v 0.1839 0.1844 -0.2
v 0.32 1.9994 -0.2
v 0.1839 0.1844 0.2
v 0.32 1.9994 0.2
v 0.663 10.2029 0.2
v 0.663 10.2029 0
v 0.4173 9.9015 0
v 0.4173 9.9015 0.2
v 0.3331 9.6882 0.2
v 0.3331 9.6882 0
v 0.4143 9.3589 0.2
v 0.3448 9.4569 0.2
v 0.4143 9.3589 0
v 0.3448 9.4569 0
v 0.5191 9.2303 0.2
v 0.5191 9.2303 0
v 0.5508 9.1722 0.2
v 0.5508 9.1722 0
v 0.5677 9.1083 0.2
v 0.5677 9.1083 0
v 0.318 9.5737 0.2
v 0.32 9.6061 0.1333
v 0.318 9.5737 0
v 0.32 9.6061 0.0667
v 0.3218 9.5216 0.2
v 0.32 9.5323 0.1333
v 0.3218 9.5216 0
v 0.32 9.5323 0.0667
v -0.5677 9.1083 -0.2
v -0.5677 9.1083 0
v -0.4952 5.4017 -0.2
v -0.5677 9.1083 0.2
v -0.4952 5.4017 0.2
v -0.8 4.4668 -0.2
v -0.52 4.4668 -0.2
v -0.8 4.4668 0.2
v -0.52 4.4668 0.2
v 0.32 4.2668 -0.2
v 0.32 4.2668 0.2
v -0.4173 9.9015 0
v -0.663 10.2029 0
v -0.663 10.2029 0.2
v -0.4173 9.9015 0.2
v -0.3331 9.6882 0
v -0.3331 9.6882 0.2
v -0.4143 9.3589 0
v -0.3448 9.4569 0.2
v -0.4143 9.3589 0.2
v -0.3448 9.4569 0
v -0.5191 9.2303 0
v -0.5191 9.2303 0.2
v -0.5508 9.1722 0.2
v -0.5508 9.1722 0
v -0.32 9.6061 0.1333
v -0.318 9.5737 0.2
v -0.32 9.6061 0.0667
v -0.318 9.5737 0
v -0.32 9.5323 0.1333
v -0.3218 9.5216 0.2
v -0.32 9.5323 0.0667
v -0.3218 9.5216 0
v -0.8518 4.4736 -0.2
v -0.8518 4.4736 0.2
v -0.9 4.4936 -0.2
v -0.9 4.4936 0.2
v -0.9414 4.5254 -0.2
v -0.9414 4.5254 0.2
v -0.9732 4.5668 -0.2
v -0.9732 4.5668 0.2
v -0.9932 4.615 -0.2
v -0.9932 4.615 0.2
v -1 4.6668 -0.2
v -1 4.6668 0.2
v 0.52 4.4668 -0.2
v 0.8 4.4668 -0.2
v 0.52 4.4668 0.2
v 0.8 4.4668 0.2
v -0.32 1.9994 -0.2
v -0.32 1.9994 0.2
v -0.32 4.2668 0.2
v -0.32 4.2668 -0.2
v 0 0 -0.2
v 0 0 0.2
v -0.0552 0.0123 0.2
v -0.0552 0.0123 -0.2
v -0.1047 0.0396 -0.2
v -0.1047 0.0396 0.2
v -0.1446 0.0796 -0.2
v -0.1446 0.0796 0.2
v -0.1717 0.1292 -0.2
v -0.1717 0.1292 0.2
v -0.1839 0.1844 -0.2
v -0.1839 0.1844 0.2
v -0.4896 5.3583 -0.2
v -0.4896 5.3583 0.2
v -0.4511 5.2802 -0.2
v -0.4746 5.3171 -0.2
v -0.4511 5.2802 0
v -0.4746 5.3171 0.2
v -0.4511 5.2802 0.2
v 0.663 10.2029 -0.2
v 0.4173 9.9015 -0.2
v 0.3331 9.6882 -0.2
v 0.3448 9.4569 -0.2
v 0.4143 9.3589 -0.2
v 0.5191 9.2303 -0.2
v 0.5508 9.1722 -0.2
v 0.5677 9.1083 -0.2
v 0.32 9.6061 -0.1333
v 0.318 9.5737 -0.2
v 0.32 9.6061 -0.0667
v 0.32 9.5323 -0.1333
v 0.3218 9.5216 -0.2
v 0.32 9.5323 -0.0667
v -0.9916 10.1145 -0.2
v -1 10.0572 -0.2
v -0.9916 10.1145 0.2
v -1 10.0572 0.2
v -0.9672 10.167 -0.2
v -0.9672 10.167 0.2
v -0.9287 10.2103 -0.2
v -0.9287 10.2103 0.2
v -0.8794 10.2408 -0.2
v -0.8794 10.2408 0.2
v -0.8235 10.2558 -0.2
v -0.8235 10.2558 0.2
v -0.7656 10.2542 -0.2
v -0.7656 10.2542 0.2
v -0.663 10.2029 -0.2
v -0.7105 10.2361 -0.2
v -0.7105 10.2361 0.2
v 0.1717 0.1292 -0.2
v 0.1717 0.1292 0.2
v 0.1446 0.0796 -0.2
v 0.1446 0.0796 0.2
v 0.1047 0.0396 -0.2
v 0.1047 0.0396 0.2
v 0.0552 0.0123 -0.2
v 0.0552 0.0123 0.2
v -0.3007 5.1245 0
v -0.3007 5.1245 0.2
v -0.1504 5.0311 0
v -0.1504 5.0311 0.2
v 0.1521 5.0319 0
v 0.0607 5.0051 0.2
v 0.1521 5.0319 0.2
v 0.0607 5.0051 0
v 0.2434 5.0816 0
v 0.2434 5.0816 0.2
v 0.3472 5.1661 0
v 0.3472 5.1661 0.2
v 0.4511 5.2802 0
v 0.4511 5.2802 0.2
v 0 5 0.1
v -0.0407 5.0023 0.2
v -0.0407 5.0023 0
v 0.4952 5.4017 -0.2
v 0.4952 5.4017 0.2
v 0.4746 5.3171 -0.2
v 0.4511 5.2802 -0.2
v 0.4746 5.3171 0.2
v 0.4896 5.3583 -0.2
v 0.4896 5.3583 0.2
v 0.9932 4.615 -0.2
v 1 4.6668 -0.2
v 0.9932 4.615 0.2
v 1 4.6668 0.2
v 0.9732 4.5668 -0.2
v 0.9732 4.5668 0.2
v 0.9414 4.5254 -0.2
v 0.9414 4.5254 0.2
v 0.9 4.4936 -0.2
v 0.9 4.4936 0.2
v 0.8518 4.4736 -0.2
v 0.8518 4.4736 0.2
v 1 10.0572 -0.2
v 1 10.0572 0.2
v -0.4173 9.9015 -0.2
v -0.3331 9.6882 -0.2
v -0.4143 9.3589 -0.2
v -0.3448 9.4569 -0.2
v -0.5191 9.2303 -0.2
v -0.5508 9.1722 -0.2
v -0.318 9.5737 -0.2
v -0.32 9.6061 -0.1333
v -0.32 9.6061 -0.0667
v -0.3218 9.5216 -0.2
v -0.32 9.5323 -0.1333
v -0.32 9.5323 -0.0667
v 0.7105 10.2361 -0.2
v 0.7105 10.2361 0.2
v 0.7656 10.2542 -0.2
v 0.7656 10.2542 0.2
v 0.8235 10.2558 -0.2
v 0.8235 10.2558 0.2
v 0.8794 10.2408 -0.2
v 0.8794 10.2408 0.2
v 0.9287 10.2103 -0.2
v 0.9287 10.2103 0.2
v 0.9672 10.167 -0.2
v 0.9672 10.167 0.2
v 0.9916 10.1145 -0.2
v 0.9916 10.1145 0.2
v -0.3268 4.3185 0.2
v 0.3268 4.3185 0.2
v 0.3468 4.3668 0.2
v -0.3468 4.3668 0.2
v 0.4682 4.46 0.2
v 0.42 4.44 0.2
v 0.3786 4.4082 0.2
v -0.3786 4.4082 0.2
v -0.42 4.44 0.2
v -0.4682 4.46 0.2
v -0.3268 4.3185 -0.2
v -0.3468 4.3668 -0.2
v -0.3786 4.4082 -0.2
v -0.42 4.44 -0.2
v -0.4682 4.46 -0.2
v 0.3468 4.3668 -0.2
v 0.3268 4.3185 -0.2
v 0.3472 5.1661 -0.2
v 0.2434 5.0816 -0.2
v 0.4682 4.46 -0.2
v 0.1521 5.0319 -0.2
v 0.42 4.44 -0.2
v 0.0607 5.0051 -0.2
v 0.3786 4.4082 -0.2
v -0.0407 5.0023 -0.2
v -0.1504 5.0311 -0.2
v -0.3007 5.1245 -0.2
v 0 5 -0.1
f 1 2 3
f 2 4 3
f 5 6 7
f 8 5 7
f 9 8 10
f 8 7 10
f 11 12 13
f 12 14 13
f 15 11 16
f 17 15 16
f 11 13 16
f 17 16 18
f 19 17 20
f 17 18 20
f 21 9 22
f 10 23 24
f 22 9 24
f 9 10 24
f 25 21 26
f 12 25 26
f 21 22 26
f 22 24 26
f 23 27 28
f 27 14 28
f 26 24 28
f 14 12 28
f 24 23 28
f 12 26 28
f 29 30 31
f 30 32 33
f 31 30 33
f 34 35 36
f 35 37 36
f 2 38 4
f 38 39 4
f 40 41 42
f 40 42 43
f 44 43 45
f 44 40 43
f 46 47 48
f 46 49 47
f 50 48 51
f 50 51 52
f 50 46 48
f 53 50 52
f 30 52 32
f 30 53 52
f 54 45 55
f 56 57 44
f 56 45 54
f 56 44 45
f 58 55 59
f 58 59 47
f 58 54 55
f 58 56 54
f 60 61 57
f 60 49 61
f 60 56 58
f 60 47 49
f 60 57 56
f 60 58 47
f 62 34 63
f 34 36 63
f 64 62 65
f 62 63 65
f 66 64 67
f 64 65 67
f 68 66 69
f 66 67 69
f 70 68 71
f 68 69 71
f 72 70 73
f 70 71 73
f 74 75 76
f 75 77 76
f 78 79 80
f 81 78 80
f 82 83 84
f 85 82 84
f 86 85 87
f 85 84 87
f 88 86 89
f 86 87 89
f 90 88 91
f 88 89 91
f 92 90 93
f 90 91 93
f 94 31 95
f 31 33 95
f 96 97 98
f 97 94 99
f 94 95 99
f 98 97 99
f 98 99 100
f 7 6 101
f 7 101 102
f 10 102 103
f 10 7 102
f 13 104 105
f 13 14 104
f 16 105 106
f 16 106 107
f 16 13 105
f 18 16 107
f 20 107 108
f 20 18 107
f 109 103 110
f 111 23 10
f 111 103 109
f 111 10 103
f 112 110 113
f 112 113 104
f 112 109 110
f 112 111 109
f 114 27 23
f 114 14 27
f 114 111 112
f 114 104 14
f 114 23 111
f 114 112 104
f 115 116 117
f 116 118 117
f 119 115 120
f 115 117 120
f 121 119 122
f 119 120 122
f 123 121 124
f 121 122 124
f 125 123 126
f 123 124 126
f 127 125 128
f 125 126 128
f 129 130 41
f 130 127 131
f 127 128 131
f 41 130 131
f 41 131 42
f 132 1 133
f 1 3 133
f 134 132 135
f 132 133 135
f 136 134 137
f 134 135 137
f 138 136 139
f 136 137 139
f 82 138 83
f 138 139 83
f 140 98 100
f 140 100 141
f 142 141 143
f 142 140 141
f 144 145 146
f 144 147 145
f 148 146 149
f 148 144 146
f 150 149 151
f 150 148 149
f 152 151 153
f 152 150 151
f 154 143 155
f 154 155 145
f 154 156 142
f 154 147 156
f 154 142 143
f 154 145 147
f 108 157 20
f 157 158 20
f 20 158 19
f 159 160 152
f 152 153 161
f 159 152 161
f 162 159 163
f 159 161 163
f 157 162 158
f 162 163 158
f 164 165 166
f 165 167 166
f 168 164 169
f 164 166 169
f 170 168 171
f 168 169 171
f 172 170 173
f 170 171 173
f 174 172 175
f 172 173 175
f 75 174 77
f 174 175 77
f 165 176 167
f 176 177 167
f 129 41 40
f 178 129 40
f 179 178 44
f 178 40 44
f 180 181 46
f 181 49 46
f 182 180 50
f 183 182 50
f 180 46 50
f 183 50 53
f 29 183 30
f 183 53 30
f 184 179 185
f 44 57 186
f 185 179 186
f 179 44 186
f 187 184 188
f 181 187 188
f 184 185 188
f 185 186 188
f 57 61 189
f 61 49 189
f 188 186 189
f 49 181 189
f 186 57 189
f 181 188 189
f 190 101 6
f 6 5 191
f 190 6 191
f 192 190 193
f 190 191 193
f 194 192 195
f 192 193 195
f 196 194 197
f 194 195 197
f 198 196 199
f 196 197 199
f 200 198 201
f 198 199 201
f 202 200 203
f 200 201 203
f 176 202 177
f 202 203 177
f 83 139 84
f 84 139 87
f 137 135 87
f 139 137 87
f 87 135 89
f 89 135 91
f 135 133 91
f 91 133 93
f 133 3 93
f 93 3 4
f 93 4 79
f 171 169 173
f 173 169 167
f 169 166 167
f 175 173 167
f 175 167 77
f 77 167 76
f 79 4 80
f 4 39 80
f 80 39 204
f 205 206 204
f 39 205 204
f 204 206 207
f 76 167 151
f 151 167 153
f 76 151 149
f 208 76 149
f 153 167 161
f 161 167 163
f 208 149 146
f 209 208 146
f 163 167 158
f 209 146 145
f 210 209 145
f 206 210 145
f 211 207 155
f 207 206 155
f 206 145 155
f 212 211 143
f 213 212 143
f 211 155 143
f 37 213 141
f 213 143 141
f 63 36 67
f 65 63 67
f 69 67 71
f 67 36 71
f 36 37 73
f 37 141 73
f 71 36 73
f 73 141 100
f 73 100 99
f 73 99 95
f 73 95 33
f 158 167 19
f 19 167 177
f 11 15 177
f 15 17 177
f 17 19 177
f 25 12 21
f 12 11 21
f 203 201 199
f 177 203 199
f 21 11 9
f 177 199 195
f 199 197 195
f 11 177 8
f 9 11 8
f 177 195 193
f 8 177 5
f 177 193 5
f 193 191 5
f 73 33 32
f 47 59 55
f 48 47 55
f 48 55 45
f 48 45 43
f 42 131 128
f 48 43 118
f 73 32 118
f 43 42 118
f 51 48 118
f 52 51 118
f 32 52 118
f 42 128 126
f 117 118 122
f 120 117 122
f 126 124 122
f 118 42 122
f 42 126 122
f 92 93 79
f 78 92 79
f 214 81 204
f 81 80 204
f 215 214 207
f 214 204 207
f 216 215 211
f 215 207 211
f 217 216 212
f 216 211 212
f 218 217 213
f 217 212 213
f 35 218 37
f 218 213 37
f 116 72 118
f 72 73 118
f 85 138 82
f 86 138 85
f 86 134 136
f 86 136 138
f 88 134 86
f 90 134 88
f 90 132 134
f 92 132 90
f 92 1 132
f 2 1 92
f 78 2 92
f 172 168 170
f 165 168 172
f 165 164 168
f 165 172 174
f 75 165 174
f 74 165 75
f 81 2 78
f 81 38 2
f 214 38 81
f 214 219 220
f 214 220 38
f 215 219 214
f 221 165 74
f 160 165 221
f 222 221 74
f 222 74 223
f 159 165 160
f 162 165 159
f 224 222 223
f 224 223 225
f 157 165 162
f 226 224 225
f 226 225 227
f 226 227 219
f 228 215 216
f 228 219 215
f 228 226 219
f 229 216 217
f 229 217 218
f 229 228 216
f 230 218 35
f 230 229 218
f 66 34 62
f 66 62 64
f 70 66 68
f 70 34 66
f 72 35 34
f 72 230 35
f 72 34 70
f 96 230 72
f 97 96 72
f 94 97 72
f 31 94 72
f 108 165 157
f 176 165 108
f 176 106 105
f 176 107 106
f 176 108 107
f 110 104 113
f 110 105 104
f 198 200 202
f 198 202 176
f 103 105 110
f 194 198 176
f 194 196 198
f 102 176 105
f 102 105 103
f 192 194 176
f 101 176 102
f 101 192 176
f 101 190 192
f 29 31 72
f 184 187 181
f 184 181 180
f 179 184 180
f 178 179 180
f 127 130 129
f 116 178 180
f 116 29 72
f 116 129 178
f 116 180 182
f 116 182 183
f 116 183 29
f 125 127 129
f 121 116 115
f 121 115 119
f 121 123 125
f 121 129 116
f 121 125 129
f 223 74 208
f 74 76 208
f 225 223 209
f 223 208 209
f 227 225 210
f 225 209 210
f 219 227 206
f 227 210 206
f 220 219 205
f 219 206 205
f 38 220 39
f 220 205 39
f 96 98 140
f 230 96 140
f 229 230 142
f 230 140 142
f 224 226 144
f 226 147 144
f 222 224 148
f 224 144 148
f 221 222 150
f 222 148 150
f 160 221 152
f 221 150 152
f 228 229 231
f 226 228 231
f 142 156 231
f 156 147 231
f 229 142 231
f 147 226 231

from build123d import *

# Parameters (mm, degrees)
BOSS_EXTRUDE1_DEPTH = 0.2


with BuildPart() as part:
    # Sketch1 → Boss-Extrude1 (new, symmetric)
    with BuildSketch(Plane.XY):
        with BuildLine():
            Line((-0.32, 1.999393664), (-0.32, 4.266775148))
            ThreePointArc((-0.32, 4.266775148), (-0.378578644, 4.408196504), (-0.52, 4.466775148))
            Line((-0.52, 4.466775148), (-0.8, 4.466775148))
            ThreePointArc((-0.8, 4.466775148), (-0.941421356, 4.525353792), (-1, 4.666775148))
            Line((-1, 4.666775148), (-1, 10.057198685))
            ThreePointArc((-1, 10.057198685), (-0.87939743, 10.240763518), (-0.663039519, 10.202944445))
            add(Edge.make_bspline(
                [(-0.663039519, 10.202944445), (-0.487599251, 10.038079386), (-0.326177604, 9.816155039), (-0.310671132, 9.388247389), (-0.548453888, 9.275984696), (-0.567669208, 9.108344969)],
                knots=[0.253308427, 0.253308427, 0.253308427, 0.253308427, 0.663171976, 0.707067436, 1, 1, 1, 1], degree=3))
            Line((-0.567669208, 9.108344969), (-0.495215905, 5.401684718))
            ThreePointArc((-0.495215905, 5.401684718), (-0.483221967, 5.337269967), (-0.451053839, 5.280188217))
            add(Edge.make_bspline(
                [(-0.451053839, 5.280188217), (0, 4.719811783), (0.451053839, 5.280188217)],
                knots=[0.043404734, 0.043404734, 0.043404734, 0.956595266, 0.956595266, 0.956595266], degree=2))
            ThreePointArc((0.451053839, 5.280188217), (0.483221967, 5.337269967), (0.495215905, 5.401684718))
            Line((0.495215905, 5.401684718), (0.567669208, 9.108344969))
            add(Edge.make_bspline(
                [(0.663039519, 10.202944445), (0.487599251, 10.038079386), (0.326177604, 9.816155039), (0.310671132, 9.388247389), (0.548453888, 9.275984696), (0.567669208, 9.108344969)],
                knots=[0.253308427, 0.253308427, 0.253308427, 0.253308427, 0.663171976, 0.707067436, 1, 1, 1, 1], degree=3))
            ThreePointArc((0.663039519, 10.202944445), (0.87939743, 10.240763518), (1, 10.057198685))
            Line((1, 10.057198685), (1, 4.666775148))
            ThreePointArc((1, 4.666775148), (0.941421356, 4.525353792), (0.8, 4.466775148))
            Line((0.8, 4.466775148), (0.52, 4.466775148))
            ThreePointArc((0.52, 4.466775148), (0.378578644, 4.408196504), (0.32, 4.266775148))
            Line((0.32, 4.266775148), (0.32, 1.999393664))
            Line((0.32, 1.999393664), (0.183878151, 0.184435674))
            ThreePointArc((0.183878151, 0.184435674), (0.126073555, 0.058186541), (0, 0))
            ThreePointArc((0, 0), (-0.126073555, 0.058186541), (-0.183878151, 0.184435674))
            Line((-0.183878151, 0.184435674), (-0.32, 1.999393664))
        make_face()
    extrude(amount=BOSS_EXTRUDE1_DEPTH, both=True)


solid = part.part
